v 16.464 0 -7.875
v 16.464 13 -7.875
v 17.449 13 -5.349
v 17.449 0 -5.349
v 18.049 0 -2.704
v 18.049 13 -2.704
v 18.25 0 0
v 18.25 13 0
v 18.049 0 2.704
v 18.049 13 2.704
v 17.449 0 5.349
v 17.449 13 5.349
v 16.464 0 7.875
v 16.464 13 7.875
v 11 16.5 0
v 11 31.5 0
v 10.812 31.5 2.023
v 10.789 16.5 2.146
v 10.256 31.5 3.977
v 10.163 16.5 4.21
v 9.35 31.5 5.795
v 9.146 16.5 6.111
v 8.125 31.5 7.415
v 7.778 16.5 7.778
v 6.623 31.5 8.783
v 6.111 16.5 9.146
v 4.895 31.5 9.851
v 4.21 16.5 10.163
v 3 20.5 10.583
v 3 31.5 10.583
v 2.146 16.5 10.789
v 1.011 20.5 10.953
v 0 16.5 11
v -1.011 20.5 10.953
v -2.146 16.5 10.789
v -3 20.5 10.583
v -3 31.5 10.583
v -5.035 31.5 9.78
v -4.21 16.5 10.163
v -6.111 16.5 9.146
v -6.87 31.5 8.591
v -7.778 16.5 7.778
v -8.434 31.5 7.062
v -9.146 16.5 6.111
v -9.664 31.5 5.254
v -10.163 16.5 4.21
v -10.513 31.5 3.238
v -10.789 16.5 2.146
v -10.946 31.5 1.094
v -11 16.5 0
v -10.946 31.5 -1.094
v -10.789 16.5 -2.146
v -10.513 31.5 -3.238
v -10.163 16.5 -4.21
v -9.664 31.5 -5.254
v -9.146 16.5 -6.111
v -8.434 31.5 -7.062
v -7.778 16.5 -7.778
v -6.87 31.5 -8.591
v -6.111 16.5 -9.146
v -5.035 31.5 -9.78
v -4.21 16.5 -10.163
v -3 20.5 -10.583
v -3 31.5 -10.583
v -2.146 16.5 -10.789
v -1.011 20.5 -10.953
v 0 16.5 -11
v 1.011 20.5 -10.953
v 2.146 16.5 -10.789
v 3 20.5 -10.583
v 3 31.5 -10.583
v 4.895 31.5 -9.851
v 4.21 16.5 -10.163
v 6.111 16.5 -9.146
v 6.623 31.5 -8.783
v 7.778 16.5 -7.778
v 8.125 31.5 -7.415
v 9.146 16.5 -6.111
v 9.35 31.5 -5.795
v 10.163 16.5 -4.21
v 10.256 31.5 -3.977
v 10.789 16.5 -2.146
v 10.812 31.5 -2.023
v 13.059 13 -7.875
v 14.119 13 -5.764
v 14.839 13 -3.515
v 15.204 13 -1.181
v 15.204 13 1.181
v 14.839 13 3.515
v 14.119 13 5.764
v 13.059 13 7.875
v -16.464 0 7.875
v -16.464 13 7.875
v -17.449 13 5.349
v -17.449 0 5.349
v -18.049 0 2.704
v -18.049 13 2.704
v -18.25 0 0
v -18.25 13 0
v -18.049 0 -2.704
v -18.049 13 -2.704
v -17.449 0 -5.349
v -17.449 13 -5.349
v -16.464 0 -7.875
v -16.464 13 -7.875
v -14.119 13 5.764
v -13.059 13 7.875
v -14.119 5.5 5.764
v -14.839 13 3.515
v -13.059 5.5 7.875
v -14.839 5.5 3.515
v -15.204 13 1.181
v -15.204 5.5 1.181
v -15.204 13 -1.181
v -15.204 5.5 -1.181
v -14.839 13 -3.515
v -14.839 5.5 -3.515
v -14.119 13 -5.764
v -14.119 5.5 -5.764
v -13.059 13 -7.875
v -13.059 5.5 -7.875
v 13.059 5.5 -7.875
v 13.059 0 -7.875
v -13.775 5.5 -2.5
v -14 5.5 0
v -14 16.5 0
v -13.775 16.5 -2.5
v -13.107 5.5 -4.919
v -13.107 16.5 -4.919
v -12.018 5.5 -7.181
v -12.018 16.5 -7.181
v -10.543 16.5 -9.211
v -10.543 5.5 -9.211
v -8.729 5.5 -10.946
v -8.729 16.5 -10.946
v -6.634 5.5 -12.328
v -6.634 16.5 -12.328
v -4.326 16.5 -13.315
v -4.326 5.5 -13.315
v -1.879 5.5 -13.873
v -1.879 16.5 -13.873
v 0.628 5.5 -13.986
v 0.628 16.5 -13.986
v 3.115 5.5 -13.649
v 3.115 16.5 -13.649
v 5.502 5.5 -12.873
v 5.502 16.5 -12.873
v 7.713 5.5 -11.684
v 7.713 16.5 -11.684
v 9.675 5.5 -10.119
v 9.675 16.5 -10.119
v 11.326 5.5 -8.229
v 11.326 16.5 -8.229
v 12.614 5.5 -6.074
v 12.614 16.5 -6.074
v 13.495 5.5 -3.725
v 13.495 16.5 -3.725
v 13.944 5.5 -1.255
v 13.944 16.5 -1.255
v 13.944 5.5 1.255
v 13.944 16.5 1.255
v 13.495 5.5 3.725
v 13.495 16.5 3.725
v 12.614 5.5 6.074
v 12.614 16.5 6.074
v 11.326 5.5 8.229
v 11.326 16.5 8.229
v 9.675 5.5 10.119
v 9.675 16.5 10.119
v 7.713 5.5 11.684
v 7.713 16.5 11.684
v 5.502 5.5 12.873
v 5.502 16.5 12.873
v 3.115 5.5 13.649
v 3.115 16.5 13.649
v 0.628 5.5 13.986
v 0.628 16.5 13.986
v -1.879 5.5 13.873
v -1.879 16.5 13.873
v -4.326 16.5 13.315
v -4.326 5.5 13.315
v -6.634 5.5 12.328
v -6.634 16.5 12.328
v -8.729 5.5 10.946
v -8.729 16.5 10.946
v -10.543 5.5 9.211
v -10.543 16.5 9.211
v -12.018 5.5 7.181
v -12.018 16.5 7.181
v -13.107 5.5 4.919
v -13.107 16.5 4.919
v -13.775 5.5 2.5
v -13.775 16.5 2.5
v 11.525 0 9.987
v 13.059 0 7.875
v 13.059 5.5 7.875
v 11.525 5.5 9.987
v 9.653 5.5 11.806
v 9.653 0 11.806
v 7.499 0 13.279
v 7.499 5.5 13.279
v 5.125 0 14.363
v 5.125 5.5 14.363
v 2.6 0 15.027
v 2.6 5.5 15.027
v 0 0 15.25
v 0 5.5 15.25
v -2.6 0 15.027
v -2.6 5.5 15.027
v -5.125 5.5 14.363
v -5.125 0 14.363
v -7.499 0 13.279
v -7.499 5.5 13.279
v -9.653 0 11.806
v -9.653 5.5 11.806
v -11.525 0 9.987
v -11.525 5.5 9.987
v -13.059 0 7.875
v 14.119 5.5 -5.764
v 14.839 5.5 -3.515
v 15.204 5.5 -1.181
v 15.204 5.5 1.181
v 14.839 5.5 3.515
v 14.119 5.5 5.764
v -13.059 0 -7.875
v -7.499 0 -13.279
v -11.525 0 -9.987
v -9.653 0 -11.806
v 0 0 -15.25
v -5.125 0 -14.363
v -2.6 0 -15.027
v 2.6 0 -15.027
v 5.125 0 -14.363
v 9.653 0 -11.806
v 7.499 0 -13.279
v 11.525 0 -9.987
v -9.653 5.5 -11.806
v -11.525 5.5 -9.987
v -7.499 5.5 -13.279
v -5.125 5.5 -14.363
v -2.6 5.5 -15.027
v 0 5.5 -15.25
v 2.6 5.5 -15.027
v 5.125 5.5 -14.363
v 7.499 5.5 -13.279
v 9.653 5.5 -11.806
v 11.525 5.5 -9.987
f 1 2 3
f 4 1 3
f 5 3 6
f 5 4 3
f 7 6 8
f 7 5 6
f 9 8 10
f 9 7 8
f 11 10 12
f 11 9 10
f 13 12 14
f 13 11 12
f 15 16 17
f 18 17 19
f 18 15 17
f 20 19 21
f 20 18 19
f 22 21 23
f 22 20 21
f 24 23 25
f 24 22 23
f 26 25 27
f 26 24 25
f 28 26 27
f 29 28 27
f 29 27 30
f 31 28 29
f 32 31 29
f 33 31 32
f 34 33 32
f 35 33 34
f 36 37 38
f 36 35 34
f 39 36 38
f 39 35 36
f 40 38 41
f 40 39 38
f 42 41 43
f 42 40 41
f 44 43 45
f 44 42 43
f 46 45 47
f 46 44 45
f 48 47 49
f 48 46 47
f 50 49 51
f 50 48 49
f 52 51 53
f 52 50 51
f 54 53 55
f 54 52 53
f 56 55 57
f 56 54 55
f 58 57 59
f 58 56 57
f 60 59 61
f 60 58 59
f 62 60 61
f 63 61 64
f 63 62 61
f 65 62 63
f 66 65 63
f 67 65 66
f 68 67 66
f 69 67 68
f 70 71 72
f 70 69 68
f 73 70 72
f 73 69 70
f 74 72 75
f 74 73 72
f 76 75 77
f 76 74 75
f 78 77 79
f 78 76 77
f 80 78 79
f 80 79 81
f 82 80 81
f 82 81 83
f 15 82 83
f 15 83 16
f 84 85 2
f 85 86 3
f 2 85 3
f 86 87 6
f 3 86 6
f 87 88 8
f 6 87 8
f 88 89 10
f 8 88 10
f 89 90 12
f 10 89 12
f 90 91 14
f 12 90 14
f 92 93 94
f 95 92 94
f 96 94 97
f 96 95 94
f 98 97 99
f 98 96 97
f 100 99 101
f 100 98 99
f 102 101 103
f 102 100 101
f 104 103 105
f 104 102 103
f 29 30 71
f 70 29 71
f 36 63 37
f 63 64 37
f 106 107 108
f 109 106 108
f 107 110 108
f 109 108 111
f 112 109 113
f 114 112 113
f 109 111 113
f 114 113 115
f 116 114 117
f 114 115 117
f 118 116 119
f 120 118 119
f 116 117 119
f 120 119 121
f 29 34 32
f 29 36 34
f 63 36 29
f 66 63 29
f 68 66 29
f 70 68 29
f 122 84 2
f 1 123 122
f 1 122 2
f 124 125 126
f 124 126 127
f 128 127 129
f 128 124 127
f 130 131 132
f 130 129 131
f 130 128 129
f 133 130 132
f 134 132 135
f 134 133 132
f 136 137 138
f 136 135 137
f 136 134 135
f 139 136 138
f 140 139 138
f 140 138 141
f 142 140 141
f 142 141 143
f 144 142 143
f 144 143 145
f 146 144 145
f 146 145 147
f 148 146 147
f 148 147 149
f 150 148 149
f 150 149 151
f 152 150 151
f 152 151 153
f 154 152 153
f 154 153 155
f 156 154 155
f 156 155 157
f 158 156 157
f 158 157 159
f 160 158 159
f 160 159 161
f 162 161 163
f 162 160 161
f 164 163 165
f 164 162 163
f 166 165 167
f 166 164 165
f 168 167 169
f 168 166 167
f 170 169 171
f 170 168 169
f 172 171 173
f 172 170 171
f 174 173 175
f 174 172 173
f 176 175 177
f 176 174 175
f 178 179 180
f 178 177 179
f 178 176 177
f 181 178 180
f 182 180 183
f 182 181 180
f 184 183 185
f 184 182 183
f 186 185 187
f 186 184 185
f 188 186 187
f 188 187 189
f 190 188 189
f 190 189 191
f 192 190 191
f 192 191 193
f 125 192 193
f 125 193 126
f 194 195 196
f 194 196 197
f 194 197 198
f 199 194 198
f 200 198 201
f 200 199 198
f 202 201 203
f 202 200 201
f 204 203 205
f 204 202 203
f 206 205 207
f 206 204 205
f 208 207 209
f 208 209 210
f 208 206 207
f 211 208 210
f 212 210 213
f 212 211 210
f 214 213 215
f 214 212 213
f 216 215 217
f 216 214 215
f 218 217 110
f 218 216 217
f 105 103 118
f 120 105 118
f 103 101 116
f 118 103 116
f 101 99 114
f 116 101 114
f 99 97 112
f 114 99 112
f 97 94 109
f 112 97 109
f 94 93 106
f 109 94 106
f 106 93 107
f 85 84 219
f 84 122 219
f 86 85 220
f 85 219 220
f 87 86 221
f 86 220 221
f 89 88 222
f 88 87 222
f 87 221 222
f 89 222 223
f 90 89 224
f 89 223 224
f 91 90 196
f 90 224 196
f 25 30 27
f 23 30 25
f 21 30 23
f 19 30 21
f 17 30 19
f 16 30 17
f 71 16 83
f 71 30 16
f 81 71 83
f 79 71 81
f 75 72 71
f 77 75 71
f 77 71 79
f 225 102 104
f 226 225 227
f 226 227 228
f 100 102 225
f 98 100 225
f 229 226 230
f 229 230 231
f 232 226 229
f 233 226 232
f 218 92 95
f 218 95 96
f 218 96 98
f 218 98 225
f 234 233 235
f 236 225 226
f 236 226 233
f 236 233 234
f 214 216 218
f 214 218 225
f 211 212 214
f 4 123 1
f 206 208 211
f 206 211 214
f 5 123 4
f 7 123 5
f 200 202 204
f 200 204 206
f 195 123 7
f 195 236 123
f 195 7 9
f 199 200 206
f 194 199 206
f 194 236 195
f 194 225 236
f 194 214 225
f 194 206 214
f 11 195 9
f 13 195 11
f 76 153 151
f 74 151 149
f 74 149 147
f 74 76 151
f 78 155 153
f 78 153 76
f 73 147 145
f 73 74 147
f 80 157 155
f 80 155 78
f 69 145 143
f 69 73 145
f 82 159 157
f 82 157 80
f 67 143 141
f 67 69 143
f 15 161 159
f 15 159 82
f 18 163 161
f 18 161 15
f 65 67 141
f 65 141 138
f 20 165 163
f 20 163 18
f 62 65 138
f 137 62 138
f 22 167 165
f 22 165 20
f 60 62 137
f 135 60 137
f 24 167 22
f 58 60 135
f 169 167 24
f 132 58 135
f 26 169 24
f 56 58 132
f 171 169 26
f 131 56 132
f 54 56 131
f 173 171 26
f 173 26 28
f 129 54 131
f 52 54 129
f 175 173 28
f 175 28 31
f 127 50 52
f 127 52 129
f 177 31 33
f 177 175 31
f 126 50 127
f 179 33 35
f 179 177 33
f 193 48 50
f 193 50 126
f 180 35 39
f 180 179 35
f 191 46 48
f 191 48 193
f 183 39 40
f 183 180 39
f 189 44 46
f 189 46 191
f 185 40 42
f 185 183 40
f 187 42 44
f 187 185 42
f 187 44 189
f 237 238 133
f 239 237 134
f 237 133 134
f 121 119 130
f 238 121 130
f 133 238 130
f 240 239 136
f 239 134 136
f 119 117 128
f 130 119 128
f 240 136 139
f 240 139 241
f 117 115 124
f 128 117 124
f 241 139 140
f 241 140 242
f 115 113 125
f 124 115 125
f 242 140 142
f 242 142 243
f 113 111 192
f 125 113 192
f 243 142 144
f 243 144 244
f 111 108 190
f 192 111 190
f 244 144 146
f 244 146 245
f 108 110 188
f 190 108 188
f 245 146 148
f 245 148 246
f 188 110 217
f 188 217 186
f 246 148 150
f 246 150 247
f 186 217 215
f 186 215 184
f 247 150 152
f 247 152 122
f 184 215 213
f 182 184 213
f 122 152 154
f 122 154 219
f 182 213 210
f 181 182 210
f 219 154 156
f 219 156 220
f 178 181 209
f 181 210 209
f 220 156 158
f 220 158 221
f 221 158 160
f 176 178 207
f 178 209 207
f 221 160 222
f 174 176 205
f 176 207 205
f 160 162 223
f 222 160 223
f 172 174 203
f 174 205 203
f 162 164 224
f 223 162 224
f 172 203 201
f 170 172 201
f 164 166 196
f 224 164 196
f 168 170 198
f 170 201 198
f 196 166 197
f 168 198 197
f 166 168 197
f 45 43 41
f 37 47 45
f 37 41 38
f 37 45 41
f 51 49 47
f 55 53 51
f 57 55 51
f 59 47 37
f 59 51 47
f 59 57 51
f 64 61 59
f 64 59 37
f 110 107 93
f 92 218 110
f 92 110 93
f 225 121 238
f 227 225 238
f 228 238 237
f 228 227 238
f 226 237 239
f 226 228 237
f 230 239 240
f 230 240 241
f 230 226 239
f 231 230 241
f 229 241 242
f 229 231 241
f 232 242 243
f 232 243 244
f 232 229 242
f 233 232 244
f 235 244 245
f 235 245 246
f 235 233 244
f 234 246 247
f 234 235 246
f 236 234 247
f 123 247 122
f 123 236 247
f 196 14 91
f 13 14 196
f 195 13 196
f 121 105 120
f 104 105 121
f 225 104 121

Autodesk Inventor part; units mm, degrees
ref_plane "YZ Plane" through (0, 0, 0) normal (1, 0, 0) x (0, 1, 0)
ref_plane "XZ Plane" through (0, 0, 0) normal (0, 1, 0) x (-1, 0, 0)
ref_plane "XY Plane" through (0, 0, 0) normal (0, 0, 1) x (1, 0, 0)
sketch "Sketch1" plane through (0, 0, 0) normal (0, 1, 0) x (-1, 0, 0)
  circle A0 centre (0, 0) radius 14
  dimension "d0" = 28
extrude "Extrusion1" add sketch "Sketch1" along normal blind 16.5
sketch "Sketch2" plane through (0, 16.5, 0) normal (0, 1, 0) x (1, 0, 0)
  circle A0 centre (0, 0) radius 11
  dimension "d3" = 22
extrude "Extrusion2" add sketch "Sketch2" along normal blind 15
sketch "Sketch3" plane through (0, 31.5, 0) normal (0, 1, 0) x (1, 0, 0)
  line L0 (-3, -11) -> (3, -11)
  line L1 (3, -11) -> (3, 11)
  line L2 (3, 11) -> (-3, 11)
  line L3 (-3, 11) -> (-3, -11)
  line L4 (-3, -11) -> (3, 11) construction
  line L5 (3, -11) -> (-3, 11) construction
  circle A0 centre (0, 0) radius 11 projected
  point P0 (3, -10.583)
  point P1 (3, 10.583)
  point P2 (-3, 10.583)
  point P3 (-3, -10.583)
  dimension "d6" = 6
  dimension "d7" = 0
extrude "Extrusion3" cut sketch "Sketch3" against normal blind 11 contours A0 L3 L1
sketch "Sketch4" plane through (0, 0, 0) normal (0, -1, 0) x (1, 0, 0)
  circle A0 centre (0, 0) radius 15.25
  dimension "d10" = 30.5
extrude "Extrusion4" add sketch "Sketch4" against normal blind 5.5
sketch "Sketch5" plane through (0, 0, 0) normal (0, -1, 0) x (1, 0, 0)
  line L0 (-16.4635, -7.875) -> (16.4635, -7.875)
  line L1 (16.4635, 7.875) -> (-16.4635, 7.875)
  circle A0 centre (0, 0) radius 15.25 projected
  arc A1 (-16.4635, 7.875) -> (-16.4635, -7.875) centre (0, 0) ccw
  arc A2 (16.4635, -7.875) -> (16.4635, 7.875) centre (0, 0) ccw
  point P0 (-13.0594, -7.875)
  point P1 (-13.0594, 7.875)
  point P2 (13.0594, 7.875)
  point P3 (13.0594, -7.875)
  dimension "d15" = 15.75
  dimension "d16" = 7.875
  dimension "d17" = 18.25
  dimension "d18" = 18.25
  dimension "d19" = 0
extrude "Extrusion5" add sketch "Sketch5" against normal blind 13 contours A1 L1 A0 L0 | A0 L1 A2 L0
properties part number "Light Water Sensor"
